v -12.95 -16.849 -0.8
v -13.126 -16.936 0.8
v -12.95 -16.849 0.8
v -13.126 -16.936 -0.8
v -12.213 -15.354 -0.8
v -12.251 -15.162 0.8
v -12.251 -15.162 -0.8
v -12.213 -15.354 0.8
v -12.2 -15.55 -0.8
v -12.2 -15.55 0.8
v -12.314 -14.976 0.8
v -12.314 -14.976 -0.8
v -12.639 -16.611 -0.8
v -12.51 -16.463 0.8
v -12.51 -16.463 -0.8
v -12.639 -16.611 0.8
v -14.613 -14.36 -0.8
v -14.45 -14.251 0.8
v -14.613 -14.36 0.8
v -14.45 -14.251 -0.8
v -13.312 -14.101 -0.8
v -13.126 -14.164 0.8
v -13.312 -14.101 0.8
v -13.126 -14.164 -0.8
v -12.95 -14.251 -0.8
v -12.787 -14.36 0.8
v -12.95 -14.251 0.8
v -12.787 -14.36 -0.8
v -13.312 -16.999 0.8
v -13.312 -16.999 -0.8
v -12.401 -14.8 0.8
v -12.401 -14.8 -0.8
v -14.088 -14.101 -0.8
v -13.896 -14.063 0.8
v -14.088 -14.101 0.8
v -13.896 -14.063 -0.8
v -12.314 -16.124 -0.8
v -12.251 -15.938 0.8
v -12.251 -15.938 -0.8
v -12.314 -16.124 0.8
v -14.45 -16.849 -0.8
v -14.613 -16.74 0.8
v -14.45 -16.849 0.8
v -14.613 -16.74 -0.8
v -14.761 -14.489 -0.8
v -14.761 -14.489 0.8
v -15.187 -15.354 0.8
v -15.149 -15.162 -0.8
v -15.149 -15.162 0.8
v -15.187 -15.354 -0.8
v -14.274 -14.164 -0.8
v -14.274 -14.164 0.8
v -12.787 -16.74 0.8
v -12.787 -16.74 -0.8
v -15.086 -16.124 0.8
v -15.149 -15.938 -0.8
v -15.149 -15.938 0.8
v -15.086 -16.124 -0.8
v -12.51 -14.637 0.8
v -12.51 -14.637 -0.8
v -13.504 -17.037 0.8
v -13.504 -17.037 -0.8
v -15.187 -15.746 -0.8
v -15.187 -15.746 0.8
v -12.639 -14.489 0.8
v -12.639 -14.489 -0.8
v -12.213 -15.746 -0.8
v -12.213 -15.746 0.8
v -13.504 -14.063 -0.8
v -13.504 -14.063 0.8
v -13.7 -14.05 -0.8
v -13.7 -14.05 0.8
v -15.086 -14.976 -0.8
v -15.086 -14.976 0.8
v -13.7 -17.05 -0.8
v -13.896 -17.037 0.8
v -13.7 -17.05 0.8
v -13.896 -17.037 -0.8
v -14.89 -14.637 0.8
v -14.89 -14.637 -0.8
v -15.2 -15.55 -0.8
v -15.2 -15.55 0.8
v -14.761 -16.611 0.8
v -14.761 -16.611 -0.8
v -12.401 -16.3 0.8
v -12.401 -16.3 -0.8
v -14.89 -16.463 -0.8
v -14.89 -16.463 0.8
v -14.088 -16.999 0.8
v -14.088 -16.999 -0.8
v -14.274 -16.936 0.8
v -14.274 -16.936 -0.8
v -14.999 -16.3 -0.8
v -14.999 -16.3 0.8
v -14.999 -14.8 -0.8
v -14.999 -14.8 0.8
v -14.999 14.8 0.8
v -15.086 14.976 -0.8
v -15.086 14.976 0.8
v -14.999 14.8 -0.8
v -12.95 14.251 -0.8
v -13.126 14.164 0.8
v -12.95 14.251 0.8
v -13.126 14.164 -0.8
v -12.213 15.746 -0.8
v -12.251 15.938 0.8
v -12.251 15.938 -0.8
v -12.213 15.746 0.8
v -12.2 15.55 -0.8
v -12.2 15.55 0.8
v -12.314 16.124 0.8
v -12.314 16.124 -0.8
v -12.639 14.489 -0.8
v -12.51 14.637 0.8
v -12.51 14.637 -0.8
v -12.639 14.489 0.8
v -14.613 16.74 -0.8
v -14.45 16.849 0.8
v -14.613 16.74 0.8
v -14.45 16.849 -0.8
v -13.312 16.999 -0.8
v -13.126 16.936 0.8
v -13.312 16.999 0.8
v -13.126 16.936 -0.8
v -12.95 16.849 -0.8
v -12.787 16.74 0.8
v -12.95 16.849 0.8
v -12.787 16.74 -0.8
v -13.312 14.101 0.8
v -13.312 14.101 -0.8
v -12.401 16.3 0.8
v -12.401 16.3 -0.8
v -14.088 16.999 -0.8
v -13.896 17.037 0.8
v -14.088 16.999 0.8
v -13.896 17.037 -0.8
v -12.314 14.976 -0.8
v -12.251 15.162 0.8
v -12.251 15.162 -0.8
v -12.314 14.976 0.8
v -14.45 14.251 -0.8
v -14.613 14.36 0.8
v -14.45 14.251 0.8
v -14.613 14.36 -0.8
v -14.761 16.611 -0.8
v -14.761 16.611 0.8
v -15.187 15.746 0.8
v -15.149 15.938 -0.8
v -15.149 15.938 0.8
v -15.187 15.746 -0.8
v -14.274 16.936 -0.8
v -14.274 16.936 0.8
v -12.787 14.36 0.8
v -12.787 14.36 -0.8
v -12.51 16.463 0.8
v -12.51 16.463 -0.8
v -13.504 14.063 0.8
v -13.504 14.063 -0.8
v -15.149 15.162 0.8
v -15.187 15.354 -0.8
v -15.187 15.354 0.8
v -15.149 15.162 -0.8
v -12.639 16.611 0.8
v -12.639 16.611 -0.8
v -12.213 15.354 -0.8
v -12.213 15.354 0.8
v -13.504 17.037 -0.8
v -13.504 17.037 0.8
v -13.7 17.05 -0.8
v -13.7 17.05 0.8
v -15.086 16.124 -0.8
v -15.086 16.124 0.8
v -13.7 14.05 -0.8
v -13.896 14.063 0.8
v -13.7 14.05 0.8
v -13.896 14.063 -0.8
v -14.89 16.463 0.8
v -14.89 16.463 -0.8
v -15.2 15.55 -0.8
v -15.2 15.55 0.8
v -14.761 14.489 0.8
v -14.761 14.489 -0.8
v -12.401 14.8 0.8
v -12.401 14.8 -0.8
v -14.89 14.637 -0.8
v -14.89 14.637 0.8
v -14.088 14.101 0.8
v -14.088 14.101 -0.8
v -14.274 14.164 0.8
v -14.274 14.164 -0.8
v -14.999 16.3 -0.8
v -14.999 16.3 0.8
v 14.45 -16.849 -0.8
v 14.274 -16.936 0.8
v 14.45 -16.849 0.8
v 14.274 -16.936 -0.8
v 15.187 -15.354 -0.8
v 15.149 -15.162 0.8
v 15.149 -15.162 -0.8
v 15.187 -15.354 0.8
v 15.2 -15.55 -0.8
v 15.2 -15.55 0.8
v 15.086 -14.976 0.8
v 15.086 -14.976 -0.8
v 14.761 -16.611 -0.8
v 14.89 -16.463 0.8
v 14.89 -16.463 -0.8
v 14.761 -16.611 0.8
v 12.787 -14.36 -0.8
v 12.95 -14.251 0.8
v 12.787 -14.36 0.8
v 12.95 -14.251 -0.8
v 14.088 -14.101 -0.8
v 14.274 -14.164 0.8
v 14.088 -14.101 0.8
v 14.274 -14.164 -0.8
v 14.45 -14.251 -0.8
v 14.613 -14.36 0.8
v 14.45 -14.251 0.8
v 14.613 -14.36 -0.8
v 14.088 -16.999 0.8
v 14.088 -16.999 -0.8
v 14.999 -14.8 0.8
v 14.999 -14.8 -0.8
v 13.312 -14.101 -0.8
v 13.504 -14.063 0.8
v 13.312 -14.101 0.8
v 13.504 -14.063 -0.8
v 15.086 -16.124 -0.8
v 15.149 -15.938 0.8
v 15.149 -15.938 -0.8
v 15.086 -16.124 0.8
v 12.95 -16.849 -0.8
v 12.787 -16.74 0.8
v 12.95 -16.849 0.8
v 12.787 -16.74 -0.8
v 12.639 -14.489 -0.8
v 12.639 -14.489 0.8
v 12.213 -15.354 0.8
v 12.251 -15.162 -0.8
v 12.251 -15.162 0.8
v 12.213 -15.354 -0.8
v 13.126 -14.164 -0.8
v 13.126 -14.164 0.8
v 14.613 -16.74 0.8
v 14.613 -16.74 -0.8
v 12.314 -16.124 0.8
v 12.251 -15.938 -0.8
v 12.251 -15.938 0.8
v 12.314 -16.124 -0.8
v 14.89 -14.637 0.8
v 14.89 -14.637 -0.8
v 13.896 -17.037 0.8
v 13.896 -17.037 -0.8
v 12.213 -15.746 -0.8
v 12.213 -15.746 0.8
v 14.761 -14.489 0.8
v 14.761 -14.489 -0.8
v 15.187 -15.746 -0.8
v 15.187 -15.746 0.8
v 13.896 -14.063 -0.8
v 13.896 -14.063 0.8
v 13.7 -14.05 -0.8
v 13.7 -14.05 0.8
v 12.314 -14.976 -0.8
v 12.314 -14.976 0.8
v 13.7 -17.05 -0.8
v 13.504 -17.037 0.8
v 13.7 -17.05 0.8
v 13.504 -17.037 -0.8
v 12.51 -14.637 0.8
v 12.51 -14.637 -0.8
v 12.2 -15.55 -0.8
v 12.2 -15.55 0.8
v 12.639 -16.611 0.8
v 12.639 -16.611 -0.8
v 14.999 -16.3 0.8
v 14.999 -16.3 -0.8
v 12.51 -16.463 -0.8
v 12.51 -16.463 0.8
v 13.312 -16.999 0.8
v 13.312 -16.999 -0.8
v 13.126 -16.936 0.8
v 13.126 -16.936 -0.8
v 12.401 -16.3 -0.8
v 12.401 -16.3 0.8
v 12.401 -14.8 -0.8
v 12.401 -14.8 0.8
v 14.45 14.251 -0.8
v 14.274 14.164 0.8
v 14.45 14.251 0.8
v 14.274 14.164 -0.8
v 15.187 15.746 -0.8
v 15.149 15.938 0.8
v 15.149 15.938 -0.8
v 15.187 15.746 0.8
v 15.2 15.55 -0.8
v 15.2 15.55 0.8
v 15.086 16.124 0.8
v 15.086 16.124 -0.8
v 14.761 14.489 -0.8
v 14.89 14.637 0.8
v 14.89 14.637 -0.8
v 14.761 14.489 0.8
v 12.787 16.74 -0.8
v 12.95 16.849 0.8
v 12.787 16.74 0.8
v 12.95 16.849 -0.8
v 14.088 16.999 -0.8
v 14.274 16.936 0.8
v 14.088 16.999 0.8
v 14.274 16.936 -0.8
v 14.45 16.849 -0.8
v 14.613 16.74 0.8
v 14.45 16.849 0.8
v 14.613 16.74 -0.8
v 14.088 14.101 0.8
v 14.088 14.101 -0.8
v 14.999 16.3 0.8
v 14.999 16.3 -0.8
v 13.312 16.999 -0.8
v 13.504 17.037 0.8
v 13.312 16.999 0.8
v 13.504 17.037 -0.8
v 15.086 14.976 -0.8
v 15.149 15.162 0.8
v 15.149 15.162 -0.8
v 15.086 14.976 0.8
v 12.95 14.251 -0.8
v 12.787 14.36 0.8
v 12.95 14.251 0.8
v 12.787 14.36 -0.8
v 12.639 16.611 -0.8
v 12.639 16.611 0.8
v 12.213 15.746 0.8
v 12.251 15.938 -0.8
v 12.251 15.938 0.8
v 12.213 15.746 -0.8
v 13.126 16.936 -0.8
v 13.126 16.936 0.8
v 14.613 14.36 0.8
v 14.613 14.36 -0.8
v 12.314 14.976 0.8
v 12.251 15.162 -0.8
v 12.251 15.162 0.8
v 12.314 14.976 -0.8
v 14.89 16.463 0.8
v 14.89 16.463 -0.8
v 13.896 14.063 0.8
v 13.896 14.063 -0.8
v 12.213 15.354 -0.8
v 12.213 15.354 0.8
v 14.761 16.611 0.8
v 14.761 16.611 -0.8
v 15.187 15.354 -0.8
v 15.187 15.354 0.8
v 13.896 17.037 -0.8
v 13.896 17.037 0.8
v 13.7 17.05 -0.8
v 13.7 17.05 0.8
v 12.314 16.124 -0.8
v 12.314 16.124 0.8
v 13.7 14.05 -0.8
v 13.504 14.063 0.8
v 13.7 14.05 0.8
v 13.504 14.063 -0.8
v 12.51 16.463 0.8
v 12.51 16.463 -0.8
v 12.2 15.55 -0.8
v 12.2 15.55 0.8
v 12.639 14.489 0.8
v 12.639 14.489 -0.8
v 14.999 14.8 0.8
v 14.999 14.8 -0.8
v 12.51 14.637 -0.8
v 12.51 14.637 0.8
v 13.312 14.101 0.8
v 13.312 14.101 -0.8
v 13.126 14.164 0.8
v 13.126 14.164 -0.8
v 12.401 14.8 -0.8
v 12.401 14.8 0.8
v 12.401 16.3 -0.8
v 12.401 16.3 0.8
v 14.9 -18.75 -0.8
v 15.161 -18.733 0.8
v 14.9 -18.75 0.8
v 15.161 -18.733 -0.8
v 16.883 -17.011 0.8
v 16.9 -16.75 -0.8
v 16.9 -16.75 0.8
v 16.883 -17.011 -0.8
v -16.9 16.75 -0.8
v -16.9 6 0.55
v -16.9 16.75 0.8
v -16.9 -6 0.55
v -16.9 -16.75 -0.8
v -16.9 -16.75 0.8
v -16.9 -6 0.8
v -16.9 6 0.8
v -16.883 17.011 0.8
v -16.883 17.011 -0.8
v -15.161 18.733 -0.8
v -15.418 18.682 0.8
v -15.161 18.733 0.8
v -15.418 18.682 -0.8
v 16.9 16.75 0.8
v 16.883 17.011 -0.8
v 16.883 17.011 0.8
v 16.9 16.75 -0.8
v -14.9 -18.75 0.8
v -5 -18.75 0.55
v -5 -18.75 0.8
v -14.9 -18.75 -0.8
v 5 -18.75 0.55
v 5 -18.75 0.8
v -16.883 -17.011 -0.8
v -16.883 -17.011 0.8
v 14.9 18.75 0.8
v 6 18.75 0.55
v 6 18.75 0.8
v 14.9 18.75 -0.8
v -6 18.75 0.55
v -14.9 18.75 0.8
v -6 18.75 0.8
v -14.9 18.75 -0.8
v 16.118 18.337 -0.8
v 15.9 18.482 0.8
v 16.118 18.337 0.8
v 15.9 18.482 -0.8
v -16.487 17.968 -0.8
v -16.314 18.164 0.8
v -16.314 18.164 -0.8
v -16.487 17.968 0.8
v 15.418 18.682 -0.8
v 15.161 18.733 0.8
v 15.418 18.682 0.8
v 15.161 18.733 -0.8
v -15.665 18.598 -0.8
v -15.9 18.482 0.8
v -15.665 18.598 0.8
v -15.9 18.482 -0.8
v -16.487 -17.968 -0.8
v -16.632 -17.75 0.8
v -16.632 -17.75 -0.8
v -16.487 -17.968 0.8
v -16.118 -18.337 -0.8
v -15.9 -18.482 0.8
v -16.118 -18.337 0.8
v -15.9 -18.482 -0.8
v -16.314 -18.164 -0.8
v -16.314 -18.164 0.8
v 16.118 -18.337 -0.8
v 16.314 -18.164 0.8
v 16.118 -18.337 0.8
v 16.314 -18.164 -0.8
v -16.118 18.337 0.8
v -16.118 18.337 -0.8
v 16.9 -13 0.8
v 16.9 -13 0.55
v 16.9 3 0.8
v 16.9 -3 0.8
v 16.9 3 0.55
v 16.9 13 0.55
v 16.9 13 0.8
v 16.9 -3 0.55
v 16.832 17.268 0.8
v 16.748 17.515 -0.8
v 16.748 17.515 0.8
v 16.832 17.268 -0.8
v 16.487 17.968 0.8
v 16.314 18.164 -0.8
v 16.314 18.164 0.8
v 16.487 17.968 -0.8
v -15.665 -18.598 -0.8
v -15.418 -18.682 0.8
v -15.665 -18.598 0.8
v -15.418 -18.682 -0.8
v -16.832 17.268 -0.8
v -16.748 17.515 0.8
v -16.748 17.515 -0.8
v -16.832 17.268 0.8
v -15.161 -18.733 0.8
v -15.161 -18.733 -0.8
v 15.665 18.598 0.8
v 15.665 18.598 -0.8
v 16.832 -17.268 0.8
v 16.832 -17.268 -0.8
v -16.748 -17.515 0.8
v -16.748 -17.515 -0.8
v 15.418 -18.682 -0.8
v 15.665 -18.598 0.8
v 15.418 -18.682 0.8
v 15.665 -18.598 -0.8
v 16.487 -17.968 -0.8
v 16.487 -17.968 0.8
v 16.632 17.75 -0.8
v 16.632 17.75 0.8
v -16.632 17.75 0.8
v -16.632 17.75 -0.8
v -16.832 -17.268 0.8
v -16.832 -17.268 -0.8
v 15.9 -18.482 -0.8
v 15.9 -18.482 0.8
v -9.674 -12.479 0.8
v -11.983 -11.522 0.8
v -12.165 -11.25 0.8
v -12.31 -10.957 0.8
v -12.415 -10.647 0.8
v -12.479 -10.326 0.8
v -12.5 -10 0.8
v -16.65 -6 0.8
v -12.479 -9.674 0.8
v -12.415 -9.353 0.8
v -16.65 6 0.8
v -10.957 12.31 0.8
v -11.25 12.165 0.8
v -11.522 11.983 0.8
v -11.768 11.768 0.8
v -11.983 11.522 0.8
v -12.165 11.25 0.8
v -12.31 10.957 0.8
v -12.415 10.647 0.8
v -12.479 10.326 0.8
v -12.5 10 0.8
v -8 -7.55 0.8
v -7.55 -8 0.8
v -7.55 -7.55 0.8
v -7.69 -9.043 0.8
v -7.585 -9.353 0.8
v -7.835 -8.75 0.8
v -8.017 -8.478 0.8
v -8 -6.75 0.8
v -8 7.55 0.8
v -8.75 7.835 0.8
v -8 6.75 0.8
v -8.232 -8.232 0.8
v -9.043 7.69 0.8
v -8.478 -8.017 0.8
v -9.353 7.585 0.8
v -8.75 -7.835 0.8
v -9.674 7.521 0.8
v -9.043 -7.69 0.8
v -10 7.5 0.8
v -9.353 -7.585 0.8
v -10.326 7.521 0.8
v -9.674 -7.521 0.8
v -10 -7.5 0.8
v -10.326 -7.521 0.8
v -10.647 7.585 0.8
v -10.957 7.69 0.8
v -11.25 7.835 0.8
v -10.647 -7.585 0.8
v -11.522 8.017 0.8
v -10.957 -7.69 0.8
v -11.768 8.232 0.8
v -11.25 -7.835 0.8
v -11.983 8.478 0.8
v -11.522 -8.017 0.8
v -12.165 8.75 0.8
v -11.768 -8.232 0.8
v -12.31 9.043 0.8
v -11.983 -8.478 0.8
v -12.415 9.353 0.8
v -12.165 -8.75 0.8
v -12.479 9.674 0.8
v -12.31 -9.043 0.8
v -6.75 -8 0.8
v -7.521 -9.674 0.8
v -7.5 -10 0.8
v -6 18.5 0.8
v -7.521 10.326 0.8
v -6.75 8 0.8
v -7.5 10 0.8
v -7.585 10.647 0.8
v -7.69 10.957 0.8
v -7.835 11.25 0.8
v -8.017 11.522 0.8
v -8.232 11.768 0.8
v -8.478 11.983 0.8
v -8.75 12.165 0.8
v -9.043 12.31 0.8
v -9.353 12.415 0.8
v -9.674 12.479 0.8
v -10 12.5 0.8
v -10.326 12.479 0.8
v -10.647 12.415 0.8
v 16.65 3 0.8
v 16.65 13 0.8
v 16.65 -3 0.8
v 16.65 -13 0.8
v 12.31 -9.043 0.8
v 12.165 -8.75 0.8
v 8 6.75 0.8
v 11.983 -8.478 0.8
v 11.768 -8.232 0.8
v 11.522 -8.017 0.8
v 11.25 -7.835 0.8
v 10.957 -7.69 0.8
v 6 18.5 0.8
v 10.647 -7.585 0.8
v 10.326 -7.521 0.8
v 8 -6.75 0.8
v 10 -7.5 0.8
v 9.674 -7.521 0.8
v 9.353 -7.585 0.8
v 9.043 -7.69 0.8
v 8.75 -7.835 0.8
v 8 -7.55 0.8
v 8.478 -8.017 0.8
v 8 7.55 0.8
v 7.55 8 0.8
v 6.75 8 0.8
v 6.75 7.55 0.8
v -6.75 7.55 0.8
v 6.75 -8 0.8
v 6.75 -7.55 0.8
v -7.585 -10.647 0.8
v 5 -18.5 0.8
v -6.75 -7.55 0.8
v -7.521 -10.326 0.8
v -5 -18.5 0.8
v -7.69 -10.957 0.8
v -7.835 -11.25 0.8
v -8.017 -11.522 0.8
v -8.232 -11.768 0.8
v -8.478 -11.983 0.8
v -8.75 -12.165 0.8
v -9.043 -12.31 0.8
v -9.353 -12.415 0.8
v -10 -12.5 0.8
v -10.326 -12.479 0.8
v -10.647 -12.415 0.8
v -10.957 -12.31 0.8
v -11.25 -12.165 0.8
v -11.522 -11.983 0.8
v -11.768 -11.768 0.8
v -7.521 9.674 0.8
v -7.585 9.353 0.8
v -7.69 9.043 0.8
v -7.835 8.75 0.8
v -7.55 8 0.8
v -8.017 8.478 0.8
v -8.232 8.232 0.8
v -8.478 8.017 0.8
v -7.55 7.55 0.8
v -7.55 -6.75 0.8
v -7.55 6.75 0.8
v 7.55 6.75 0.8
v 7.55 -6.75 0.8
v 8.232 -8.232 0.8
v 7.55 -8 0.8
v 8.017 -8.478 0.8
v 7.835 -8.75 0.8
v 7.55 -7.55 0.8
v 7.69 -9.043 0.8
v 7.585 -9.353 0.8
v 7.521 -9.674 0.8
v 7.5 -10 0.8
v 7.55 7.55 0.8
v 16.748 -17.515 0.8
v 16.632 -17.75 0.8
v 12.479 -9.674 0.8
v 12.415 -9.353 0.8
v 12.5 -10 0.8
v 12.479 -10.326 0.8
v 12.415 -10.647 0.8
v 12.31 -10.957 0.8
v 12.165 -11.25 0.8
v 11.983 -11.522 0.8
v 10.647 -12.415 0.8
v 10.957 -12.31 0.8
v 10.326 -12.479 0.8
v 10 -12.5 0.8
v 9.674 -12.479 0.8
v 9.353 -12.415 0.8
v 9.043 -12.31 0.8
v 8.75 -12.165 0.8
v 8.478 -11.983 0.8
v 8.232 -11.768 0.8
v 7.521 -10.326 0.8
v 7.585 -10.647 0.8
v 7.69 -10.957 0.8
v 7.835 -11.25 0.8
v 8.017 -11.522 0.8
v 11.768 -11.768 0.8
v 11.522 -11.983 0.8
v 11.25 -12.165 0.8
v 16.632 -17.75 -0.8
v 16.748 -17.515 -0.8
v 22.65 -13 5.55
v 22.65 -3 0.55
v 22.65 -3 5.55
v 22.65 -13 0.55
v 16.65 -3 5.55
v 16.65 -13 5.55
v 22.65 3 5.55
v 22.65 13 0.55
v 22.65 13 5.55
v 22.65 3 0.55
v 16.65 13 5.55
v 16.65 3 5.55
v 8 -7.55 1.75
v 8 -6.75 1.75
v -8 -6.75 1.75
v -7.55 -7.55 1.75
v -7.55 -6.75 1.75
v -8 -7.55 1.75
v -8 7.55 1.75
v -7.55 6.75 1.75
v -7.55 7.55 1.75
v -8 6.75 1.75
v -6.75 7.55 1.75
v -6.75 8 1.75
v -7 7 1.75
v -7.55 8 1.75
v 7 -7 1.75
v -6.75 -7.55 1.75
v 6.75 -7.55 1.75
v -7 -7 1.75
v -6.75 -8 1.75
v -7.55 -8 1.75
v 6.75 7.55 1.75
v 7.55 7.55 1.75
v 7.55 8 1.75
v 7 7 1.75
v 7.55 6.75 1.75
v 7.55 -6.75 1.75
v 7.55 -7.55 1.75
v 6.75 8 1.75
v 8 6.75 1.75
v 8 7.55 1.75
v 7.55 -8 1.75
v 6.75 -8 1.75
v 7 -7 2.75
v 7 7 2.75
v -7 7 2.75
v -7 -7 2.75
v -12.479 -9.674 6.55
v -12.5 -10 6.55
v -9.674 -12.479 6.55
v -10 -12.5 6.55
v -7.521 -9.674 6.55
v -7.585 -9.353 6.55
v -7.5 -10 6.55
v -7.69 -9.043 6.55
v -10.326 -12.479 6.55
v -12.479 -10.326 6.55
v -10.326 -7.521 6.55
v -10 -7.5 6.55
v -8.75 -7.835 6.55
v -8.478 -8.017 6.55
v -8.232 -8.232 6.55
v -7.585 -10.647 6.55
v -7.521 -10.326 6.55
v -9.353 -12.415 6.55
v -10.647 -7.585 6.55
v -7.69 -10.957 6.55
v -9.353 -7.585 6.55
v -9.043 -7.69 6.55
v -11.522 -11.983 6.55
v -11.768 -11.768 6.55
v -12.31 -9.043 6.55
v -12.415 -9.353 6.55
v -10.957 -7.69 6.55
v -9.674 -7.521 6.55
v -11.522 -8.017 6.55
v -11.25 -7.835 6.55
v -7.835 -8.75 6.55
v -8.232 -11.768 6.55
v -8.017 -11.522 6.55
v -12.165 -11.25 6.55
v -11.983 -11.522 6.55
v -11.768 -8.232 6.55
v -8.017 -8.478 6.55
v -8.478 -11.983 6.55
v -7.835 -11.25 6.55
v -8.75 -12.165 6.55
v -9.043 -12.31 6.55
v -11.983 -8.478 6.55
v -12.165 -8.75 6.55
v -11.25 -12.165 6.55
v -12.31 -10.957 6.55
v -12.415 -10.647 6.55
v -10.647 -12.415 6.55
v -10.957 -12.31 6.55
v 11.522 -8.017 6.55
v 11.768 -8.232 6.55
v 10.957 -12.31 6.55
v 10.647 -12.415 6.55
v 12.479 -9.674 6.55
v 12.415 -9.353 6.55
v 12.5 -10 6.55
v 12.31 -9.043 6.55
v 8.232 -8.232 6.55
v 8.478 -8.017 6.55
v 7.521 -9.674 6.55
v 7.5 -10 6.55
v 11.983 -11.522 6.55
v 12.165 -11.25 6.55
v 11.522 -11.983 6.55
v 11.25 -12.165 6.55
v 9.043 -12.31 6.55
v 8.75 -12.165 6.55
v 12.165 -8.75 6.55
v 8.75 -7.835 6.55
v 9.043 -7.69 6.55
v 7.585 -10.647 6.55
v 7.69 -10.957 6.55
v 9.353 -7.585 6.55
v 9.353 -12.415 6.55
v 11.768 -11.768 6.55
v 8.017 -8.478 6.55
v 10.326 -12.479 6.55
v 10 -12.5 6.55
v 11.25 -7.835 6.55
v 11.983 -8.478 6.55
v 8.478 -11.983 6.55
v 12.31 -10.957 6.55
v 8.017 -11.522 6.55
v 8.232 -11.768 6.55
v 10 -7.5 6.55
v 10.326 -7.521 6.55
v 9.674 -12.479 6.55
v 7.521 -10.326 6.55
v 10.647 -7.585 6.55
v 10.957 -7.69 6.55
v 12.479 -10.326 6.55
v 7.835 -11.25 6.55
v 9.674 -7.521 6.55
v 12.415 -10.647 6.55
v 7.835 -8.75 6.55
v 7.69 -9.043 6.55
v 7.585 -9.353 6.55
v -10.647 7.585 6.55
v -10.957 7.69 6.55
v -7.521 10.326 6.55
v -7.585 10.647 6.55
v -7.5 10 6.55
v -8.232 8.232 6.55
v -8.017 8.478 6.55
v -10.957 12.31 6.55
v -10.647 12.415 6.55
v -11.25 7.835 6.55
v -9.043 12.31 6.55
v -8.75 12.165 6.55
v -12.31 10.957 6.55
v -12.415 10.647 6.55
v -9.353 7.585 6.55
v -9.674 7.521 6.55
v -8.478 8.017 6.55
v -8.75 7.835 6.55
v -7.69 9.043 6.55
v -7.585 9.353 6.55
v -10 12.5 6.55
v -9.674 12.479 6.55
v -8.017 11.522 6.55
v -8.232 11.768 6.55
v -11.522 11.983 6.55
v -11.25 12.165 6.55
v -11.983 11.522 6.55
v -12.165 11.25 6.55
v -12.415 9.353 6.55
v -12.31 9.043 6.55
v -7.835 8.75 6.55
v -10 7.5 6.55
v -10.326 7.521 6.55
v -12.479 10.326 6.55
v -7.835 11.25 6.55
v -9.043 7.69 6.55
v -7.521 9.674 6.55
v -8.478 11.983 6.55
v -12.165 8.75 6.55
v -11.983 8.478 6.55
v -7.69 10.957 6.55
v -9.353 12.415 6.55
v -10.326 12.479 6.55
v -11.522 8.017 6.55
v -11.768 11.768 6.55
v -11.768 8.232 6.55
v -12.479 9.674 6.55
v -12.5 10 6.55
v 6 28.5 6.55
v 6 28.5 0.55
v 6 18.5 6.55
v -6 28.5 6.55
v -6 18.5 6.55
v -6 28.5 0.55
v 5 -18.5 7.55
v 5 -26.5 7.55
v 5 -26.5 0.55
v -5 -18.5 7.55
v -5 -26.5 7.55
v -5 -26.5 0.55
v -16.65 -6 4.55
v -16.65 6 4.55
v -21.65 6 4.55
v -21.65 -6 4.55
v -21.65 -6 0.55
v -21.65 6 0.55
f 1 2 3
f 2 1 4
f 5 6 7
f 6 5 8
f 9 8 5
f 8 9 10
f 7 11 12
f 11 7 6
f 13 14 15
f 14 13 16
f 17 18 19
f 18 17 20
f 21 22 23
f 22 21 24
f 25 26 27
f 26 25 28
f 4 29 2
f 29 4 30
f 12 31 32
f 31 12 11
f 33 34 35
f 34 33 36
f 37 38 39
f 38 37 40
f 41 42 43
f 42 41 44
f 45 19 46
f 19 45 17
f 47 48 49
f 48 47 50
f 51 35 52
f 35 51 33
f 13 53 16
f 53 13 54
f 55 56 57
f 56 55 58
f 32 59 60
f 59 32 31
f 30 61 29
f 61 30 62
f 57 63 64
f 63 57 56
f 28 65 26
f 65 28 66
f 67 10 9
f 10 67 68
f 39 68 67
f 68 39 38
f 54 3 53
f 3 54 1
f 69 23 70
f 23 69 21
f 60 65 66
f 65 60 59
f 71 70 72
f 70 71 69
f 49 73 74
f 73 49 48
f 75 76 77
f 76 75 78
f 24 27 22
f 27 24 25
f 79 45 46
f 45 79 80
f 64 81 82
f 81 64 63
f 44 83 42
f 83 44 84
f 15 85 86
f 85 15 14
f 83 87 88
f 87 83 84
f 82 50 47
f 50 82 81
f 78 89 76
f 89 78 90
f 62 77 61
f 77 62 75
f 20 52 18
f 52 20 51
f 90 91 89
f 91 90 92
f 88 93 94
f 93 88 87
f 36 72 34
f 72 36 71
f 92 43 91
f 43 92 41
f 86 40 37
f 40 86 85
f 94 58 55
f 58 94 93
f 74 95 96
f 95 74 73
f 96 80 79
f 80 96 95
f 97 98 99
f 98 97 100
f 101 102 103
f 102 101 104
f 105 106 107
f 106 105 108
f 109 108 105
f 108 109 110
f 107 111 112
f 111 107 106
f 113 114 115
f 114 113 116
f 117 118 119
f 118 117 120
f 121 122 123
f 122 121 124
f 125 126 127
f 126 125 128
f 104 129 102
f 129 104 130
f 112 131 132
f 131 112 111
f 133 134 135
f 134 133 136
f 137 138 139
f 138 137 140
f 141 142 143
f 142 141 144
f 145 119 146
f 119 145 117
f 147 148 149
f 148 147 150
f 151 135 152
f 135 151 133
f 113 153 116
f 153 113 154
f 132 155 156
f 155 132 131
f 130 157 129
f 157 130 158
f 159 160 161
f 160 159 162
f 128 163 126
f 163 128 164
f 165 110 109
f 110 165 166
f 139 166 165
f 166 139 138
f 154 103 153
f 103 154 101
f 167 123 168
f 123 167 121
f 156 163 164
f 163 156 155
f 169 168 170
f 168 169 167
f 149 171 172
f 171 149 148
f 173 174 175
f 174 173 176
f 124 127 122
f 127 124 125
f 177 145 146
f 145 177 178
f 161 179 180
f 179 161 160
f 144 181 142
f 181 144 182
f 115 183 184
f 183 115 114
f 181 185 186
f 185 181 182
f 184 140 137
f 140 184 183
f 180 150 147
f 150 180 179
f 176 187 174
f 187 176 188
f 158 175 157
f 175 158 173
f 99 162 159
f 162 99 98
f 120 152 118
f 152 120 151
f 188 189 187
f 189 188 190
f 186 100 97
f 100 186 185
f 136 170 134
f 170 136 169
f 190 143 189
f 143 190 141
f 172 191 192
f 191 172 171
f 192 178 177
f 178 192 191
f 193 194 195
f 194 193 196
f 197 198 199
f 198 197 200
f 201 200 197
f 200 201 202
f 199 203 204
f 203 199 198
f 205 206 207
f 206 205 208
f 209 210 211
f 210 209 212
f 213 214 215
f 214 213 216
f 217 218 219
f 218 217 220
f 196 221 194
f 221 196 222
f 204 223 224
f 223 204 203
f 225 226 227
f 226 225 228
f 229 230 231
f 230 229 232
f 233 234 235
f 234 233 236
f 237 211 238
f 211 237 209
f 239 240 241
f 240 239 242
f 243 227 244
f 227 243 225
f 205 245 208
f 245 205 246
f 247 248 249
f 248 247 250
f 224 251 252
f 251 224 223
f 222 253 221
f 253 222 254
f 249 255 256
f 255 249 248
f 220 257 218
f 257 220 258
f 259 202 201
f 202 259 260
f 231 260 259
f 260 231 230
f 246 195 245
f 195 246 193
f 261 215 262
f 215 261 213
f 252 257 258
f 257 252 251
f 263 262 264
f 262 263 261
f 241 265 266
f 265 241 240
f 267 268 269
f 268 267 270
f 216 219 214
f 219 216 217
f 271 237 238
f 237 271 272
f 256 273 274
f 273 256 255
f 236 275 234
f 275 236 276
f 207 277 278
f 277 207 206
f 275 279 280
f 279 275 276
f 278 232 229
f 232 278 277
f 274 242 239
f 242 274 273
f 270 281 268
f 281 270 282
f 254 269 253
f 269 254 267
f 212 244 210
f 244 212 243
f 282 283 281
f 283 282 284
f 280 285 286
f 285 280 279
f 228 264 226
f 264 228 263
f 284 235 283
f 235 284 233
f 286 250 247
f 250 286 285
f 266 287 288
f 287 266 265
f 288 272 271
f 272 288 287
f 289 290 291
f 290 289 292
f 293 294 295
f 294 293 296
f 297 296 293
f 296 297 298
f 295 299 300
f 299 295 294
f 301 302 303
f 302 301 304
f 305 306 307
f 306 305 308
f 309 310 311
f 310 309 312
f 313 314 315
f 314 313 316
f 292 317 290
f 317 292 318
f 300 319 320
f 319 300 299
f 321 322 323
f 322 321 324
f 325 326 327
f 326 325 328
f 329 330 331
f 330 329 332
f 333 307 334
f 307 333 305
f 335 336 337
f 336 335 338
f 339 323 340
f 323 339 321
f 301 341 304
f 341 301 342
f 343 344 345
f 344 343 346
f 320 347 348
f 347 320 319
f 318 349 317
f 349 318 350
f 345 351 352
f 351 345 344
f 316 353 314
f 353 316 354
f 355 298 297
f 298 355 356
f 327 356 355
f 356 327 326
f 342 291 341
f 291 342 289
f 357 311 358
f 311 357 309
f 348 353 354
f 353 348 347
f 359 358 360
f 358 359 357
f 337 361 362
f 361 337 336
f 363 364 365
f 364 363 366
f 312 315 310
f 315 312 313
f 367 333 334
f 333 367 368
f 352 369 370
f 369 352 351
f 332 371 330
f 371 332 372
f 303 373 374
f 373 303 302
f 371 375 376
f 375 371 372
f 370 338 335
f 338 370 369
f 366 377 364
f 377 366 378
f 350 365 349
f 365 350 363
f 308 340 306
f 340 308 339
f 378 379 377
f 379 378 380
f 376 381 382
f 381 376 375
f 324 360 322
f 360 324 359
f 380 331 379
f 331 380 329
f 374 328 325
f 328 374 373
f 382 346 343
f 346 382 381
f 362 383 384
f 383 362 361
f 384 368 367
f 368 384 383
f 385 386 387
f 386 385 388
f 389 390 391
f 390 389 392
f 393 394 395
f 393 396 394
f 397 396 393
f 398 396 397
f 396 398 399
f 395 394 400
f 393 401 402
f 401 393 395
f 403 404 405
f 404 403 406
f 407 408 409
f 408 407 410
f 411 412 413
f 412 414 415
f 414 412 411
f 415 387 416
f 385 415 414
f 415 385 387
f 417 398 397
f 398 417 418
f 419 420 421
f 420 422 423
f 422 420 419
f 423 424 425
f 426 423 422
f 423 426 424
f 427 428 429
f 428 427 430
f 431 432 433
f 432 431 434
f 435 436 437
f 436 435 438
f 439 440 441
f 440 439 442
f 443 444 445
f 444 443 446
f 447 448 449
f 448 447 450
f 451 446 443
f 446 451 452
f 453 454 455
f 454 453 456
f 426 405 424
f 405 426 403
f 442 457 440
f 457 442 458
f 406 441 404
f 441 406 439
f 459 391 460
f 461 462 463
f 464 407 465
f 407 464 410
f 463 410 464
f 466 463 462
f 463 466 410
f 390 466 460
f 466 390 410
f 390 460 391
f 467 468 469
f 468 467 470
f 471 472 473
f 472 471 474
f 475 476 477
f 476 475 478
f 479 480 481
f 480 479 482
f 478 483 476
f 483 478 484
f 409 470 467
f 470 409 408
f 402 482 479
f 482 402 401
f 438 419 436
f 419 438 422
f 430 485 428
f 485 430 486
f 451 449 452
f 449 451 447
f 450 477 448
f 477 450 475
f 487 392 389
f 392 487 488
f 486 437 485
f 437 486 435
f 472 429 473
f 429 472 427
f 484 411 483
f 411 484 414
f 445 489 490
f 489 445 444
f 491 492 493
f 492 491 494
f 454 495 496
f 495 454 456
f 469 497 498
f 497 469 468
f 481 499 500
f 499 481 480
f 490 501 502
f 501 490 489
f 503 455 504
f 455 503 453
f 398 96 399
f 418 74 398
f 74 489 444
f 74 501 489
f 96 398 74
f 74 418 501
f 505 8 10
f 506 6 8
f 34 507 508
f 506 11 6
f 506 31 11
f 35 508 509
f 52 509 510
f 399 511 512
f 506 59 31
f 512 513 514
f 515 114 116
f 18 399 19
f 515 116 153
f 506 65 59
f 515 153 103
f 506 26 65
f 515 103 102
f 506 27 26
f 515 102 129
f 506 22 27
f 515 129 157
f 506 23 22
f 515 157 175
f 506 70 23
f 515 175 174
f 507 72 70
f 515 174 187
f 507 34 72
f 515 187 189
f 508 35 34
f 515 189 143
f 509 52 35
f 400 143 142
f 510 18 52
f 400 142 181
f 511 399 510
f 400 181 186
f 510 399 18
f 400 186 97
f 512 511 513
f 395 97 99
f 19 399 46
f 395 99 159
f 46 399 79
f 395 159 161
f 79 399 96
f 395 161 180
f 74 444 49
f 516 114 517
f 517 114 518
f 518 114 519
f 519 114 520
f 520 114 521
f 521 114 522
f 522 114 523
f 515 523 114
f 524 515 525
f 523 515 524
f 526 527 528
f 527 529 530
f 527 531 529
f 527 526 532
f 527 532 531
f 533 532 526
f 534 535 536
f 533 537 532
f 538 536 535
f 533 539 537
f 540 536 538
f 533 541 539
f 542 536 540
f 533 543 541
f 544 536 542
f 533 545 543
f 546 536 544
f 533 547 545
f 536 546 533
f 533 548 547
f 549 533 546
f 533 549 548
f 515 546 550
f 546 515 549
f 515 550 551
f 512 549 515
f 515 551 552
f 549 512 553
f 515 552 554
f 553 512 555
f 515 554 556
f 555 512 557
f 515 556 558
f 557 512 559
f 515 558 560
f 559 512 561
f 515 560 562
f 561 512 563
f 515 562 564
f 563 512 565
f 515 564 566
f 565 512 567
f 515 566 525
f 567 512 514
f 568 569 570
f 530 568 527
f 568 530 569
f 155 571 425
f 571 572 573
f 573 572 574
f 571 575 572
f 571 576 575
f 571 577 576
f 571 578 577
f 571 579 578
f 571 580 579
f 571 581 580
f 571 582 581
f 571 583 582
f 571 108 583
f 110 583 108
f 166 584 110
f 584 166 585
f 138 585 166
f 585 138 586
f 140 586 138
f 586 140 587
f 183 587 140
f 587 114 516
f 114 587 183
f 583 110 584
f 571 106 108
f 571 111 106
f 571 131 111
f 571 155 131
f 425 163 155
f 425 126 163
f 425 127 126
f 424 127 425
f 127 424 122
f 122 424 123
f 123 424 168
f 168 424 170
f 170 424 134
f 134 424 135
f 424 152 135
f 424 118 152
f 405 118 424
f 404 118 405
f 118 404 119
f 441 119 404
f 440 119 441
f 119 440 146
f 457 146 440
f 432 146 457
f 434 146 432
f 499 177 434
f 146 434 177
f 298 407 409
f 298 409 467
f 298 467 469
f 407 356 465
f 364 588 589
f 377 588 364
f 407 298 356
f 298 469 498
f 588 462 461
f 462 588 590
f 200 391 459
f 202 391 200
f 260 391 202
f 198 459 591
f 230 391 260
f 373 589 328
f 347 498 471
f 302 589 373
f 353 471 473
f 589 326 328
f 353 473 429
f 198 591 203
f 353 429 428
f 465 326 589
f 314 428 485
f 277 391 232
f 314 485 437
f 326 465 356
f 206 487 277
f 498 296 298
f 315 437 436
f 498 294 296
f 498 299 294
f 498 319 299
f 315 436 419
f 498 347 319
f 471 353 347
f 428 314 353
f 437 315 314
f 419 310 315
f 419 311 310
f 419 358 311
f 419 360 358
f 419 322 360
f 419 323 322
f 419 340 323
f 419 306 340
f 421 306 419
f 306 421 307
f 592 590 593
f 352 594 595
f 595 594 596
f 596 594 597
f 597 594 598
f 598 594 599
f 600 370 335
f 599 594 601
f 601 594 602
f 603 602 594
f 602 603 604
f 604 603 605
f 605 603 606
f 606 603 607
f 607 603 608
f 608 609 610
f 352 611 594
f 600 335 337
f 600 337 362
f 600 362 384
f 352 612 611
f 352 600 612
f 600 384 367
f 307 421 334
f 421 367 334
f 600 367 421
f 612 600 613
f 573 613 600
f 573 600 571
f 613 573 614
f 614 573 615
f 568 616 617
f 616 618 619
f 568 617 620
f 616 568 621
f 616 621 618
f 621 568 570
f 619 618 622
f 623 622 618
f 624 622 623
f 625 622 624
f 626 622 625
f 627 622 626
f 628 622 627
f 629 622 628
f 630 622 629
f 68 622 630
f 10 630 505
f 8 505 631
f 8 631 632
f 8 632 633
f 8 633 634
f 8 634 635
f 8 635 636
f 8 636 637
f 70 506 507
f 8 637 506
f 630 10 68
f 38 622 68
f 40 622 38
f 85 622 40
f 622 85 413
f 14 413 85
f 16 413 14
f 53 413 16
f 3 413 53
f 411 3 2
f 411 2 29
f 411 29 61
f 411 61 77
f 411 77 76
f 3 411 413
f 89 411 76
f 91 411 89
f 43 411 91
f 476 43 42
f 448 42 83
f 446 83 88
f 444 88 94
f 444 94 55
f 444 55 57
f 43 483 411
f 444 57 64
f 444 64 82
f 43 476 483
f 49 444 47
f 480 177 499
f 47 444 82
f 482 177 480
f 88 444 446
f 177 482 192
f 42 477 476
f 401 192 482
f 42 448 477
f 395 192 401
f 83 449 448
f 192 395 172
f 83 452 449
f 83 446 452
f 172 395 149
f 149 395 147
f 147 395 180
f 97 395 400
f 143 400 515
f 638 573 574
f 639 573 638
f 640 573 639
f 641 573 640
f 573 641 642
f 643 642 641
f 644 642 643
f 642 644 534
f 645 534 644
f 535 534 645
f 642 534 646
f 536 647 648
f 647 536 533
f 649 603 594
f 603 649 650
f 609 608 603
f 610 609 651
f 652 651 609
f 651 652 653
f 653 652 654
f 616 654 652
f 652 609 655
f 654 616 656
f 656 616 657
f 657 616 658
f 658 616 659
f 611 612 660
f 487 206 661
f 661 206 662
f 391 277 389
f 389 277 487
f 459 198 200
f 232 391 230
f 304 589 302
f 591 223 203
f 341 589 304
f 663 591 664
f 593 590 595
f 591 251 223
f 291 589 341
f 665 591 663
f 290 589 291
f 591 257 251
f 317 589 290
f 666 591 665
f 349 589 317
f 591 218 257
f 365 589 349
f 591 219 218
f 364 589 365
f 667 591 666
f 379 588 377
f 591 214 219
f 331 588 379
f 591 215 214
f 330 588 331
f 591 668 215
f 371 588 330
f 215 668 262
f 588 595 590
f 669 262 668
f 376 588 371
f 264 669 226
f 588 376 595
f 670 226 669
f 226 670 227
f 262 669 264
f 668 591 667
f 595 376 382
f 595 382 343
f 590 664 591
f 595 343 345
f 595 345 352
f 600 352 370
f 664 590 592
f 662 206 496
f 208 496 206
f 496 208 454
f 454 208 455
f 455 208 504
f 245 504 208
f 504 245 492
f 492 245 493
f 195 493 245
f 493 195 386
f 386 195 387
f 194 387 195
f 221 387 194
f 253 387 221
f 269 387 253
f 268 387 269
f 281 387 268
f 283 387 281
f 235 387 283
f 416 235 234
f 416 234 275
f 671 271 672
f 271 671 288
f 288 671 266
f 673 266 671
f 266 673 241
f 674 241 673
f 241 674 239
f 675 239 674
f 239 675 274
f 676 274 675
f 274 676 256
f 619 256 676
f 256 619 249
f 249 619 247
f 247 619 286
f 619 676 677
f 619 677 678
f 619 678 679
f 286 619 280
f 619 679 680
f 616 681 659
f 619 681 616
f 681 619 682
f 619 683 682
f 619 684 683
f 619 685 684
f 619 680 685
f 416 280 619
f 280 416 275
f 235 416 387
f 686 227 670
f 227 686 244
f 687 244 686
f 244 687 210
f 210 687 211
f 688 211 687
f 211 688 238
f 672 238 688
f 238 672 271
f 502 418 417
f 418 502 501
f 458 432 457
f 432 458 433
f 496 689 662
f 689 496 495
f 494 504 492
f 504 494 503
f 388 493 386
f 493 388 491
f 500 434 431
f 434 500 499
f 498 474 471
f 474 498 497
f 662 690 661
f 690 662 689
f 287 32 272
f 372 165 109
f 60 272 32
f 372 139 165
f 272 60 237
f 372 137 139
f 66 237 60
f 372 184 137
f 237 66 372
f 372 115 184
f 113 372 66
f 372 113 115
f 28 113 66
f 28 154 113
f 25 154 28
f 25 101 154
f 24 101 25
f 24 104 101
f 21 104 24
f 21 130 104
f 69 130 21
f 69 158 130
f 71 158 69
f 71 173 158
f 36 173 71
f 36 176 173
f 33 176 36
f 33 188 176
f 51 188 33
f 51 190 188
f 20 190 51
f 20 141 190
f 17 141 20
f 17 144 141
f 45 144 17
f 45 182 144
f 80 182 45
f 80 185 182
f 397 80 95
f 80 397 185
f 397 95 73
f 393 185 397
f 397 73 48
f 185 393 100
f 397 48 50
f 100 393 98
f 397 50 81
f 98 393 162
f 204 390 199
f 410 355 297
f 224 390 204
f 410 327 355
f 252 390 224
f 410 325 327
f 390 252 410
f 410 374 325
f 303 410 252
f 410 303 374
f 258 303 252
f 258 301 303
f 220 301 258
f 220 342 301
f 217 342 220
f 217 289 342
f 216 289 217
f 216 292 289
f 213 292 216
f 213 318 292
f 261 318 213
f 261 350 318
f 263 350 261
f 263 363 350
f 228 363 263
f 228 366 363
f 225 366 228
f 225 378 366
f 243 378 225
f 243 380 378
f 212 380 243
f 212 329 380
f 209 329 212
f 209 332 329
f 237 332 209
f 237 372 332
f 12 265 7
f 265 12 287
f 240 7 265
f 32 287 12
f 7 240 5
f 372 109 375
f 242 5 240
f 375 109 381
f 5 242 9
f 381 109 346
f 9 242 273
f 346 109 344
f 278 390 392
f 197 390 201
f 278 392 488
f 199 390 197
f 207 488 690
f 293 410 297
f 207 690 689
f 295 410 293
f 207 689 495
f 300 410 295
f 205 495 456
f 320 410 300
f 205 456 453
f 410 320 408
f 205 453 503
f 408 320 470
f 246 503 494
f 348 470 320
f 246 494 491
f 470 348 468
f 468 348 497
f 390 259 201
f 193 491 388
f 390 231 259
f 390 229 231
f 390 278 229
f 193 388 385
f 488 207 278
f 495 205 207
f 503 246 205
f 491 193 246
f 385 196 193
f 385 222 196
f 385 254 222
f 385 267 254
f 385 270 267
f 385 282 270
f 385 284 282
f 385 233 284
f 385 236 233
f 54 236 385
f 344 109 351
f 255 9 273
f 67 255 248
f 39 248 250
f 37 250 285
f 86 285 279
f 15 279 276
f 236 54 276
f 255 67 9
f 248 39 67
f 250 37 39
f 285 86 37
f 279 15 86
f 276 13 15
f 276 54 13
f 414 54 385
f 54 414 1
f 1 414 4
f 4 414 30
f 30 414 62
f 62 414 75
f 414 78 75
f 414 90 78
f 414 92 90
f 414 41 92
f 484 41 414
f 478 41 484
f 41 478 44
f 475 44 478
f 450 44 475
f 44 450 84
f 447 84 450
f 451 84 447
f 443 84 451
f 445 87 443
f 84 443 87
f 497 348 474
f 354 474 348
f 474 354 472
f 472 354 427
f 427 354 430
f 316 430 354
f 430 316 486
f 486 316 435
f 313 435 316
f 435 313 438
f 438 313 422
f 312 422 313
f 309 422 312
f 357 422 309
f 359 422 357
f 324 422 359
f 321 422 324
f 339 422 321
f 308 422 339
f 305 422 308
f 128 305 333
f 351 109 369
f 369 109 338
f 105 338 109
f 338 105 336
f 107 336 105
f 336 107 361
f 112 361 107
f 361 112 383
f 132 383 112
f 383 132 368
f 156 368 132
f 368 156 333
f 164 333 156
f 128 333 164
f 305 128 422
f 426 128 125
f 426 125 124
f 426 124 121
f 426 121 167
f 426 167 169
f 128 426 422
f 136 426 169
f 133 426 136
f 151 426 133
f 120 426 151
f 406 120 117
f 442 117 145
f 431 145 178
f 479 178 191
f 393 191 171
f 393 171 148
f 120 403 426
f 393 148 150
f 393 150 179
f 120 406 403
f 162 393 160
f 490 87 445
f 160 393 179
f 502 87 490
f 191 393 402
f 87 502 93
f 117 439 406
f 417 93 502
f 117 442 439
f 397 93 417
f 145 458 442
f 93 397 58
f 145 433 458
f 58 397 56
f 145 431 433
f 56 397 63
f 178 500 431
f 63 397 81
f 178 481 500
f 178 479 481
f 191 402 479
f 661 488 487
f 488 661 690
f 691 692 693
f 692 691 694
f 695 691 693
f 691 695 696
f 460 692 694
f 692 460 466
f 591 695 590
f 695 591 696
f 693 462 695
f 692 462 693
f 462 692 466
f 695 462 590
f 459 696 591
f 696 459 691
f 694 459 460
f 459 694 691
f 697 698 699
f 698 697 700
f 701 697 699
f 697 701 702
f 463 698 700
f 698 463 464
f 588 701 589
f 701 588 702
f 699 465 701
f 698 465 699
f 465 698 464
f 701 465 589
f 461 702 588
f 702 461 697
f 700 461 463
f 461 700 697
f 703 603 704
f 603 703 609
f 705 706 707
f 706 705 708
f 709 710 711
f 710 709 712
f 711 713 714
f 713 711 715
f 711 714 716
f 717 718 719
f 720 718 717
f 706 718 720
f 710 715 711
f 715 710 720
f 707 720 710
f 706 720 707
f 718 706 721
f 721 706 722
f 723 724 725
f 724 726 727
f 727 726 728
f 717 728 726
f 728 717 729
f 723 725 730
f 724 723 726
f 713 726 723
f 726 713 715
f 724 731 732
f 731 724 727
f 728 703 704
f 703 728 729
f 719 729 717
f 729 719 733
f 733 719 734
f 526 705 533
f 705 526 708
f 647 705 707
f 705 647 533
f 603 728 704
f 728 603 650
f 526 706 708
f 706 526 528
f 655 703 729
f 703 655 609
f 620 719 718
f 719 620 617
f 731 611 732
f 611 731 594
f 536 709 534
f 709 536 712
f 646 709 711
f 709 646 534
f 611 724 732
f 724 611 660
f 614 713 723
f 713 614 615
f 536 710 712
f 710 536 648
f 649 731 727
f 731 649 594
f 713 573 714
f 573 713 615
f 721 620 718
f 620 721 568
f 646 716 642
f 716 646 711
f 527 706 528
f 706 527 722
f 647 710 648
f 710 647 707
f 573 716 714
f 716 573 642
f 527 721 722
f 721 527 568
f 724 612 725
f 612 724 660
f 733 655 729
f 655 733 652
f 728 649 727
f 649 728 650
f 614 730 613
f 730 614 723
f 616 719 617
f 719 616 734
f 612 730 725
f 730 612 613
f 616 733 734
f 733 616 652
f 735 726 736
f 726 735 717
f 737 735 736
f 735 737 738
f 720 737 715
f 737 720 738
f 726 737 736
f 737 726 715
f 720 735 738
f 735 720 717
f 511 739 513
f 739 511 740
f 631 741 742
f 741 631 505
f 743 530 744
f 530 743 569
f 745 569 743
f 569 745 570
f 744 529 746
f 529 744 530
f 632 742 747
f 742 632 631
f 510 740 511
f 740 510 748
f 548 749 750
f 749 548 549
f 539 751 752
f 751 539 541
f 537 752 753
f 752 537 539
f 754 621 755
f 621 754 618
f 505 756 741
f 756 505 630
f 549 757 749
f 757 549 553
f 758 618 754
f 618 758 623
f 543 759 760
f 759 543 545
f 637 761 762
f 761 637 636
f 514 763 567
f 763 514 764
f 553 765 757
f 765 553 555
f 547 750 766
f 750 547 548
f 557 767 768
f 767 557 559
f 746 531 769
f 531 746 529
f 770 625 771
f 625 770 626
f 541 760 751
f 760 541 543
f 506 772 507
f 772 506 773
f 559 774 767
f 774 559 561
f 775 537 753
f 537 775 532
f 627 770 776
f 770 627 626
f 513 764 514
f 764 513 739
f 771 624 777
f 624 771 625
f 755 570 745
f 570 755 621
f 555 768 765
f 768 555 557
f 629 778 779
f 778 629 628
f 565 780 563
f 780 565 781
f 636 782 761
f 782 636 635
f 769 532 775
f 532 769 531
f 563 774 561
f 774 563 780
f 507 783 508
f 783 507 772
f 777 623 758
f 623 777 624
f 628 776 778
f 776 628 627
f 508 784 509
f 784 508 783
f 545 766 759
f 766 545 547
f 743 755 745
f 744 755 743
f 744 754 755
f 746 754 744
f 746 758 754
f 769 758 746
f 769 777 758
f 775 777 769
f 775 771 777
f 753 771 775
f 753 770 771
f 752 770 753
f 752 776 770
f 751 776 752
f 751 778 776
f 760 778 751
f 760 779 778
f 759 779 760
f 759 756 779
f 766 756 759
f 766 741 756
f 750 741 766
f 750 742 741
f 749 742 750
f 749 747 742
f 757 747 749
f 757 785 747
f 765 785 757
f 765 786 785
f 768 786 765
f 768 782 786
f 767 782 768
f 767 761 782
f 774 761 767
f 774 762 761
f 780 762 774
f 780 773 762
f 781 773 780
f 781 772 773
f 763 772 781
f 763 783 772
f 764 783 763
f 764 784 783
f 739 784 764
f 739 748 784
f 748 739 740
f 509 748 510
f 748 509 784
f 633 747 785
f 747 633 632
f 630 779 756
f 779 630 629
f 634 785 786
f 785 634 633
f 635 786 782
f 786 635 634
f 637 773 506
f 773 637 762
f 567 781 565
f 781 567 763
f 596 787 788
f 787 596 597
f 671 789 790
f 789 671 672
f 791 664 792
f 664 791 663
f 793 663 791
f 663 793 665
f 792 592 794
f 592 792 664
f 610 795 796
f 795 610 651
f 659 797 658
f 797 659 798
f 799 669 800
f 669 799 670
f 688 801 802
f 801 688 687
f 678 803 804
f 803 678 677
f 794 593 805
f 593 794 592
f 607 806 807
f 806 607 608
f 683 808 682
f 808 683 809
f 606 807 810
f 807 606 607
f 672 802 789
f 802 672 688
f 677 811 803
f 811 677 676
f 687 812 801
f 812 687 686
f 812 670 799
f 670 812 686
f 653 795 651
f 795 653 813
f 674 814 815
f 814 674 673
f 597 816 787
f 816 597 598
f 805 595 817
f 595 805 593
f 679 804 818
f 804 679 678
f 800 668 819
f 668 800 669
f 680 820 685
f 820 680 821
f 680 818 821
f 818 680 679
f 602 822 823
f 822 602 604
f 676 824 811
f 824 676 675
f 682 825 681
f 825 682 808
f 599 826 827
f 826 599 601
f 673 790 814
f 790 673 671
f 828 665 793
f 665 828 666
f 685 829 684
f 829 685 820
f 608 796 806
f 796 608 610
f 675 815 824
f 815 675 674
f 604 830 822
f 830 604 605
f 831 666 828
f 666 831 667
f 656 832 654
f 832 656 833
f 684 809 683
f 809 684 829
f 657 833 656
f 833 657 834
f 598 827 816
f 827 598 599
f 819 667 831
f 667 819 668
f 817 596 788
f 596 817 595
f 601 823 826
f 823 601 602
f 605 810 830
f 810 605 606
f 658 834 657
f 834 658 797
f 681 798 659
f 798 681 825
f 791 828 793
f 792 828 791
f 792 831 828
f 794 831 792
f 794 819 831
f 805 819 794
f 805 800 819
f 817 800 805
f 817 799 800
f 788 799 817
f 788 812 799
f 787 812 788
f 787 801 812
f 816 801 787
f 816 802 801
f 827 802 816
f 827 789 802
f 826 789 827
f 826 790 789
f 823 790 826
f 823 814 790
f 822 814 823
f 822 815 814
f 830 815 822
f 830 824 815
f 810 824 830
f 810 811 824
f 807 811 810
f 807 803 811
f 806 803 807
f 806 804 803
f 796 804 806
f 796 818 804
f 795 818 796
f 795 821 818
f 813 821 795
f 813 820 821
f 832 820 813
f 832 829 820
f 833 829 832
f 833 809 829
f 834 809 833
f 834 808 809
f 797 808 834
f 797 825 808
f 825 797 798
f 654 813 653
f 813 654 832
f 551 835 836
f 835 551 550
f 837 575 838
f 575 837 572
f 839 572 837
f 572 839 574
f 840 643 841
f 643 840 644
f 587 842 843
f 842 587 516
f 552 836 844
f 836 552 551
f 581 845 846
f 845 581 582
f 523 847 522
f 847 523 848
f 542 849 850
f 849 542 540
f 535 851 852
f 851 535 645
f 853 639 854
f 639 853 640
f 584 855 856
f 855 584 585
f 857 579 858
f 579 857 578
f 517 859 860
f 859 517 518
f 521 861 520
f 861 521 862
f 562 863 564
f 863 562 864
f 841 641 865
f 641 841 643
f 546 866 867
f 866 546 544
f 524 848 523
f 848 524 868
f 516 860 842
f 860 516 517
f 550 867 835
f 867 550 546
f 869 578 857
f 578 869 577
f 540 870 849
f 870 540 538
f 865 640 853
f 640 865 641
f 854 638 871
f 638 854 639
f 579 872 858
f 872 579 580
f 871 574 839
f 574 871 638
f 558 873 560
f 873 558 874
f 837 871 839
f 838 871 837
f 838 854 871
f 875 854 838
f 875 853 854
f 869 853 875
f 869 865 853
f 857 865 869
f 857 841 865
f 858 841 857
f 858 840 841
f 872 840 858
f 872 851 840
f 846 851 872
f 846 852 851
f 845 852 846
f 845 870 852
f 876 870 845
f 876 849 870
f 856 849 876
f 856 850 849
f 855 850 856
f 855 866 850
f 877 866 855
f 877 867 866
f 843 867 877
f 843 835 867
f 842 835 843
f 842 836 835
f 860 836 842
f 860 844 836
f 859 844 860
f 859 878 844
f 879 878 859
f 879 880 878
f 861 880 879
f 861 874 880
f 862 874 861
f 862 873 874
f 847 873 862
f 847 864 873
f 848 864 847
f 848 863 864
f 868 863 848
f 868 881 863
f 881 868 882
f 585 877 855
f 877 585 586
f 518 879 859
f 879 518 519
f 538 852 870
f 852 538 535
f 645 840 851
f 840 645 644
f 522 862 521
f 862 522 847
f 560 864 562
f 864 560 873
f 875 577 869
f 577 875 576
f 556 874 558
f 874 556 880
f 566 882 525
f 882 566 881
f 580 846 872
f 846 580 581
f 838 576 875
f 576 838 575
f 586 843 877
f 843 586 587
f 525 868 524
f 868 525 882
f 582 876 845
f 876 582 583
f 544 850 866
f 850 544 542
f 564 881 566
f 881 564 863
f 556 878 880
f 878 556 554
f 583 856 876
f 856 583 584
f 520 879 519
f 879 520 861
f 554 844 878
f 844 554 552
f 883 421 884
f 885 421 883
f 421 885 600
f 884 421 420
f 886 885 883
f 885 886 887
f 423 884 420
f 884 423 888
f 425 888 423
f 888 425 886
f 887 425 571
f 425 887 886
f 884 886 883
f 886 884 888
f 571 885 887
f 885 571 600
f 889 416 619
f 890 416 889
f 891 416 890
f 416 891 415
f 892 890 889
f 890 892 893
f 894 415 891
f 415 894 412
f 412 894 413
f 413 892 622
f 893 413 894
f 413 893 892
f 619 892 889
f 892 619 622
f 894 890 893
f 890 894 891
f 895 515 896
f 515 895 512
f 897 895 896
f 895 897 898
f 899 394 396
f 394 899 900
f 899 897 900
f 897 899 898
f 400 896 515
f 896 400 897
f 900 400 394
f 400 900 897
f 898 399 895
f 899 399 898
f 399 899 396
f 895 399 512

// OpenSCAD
$fn = 48;

// Board dimensions (must match request)
width_mm     = 33.8;   // X
length_mm    = 37.5;   // Y
thickness_mm = 1.6;    // Z

// Small overlap to guarantee one connected solid
overlap = 0.25;

// ---------- Helpers ----------
module rounded_rect_prism(size=[10,10,1], r=1, center=true) {
    x = size[0]; y = size[1]; z = size[2];
    translate(center ? [0,0,0] : [x/2,y/2,z/2])
        linear_extrude(height=z, center=true)
            offset(r=r)
                square([x-2*r, y-2*r], center=true);
}

module pin_row(n=4, pitch=2.54, pin=[0.7,0.7,3.0]) {
    for (i=[0:n-1]) {
        translate([(i-(n-1)/2)*pitch, 0, 0])
            cube(pin, center=true);
    }
}

// ---------- Main PCB ----------
module pcb_board() {
    // Slightly rounded PCB with mounting holes (holes are cut, but board remains solid)
    corner_r = 2.0;
    hole_d   = 3.0;
    hole_off = 3.2; // from edges

    difference() {
        color([0.0, 0.4, 0.2])
            rounded_rect_prism([width_mm, length_mm, thickness_mm], r=corner_r, center=true);

        // 4 mounting holes
        for (sx=[-1,1], sy=[-1,1]) {
            translate([ sx*(width_mm/2 - hole_off),
                        sy*(length_mm/2 - hole_off),
                        0 ])
                cylinder(d=hole_d, h=thickness_mm + 2, center=true);
        }
    }
}

// ---------- Components (all connected to PCB via overlap) ----------
module usb_connector() {
    // USB-B-ish block on one edge
    body = [12.0, 10.0, 6.0]; // X,Y,Z
    // Place so it protrudes beyond +Y edge, sitting on top of PCB
    translate([0,
               length_mm/2 + body[1]/2 - overlap,
               thickness_mm/2 + body[2]/2 - overlap])
        cube(body, center=true);
}

module power_terminal() {
    // 2-pin screw terminal near -Y edge
    body = [10.0, 8.0, 7.0];
    translate([0,
               -length_mm/2 - body[1]/2 + overlap,
               thickness_mm/2 + body[2]/2 - overlap])
        cube(body, center=true);
}

module stepper_headers() {
    // Two 2x4-ish header blocks along +X edge
    hdr = [6.0, 10.0, 5.0];

    for (ypos = [-8.0, 8.0]) {
        translate([ width_mm/2 + hdr[0]/2 - overlap,
                    ypos,
                    thickness_mm/2 + hdr[2]/2 - overlap ])
            cube(hdr, center=true);
    }
}

module endstop_headers() {
    // Small pin headers along -X edge
    hdr = [5.0, 12.0, 4.0];
    translate([ -width_mm/2 - hdr[0]/2 + overlap,
                0,
                thickness_mm/2 + hdr[2]/2 - overlap ])
        cube(hdr, center=true);
}

module mcu_chip() {
    // Central MCU package
    chip = [14.0, 14.0, 2.2];
    translate([0, 0, thickness_mm/2 + chip[2]/2 - overlap])
        cube(chip, center=true);

    // Simple "pins" as a skirt to look more like an IC (still connected)
    pin_h = 1.2;
    pin_t = 0.8;
    // North/South pin strips
    for (sy=[-1,1]) {
        translate([0,
                   sy*(chip[1]/2 + pin_t/2 - overlap),
                   thickness_mm/2 + pin_h/2 - overlap])
            cube([chip[0] + 2.0, pin_t, pin_h], center=true);
    }
    // East/West pin strips
    for (sx=[-1,1]) {
        translate([sx*(chip[0]/2 + pin_t/2 - overlap),
                   0,
                   thickness_mm/2 + pin_h/2 - overlap])
            cube([pin_t, chip[1] + 2.0, pin_h], center=true);
    }
}

module capacitors() {
    // A few cylindrical caps near power area
    cap_d = 5.0;
    cap_h = 6.0;

    for (p = [[-10, -10], [10, -10], [-10, 10]]) {
        translate([p[0], p[1], thickness_mm/2 + cap_h/2 - overlap])
            cylinder(d=cap_d, h=cap_h, center=true);
    }
}

module board_assembly() {
    union() {
        pcb_board();

        // Components (all placed with formulas relative to board edges)
        color("DimGray") usb_connector();
        color("DimGray") power_terminal();
        color("DimGray") stepper_headers();
        color("DimGray") endstop_headers();
        color([0.15,0.15,0.15]) mcu_chip();
        color([0.2,0.2,0.2]) capacitors();
    }
}

board_assembly();
